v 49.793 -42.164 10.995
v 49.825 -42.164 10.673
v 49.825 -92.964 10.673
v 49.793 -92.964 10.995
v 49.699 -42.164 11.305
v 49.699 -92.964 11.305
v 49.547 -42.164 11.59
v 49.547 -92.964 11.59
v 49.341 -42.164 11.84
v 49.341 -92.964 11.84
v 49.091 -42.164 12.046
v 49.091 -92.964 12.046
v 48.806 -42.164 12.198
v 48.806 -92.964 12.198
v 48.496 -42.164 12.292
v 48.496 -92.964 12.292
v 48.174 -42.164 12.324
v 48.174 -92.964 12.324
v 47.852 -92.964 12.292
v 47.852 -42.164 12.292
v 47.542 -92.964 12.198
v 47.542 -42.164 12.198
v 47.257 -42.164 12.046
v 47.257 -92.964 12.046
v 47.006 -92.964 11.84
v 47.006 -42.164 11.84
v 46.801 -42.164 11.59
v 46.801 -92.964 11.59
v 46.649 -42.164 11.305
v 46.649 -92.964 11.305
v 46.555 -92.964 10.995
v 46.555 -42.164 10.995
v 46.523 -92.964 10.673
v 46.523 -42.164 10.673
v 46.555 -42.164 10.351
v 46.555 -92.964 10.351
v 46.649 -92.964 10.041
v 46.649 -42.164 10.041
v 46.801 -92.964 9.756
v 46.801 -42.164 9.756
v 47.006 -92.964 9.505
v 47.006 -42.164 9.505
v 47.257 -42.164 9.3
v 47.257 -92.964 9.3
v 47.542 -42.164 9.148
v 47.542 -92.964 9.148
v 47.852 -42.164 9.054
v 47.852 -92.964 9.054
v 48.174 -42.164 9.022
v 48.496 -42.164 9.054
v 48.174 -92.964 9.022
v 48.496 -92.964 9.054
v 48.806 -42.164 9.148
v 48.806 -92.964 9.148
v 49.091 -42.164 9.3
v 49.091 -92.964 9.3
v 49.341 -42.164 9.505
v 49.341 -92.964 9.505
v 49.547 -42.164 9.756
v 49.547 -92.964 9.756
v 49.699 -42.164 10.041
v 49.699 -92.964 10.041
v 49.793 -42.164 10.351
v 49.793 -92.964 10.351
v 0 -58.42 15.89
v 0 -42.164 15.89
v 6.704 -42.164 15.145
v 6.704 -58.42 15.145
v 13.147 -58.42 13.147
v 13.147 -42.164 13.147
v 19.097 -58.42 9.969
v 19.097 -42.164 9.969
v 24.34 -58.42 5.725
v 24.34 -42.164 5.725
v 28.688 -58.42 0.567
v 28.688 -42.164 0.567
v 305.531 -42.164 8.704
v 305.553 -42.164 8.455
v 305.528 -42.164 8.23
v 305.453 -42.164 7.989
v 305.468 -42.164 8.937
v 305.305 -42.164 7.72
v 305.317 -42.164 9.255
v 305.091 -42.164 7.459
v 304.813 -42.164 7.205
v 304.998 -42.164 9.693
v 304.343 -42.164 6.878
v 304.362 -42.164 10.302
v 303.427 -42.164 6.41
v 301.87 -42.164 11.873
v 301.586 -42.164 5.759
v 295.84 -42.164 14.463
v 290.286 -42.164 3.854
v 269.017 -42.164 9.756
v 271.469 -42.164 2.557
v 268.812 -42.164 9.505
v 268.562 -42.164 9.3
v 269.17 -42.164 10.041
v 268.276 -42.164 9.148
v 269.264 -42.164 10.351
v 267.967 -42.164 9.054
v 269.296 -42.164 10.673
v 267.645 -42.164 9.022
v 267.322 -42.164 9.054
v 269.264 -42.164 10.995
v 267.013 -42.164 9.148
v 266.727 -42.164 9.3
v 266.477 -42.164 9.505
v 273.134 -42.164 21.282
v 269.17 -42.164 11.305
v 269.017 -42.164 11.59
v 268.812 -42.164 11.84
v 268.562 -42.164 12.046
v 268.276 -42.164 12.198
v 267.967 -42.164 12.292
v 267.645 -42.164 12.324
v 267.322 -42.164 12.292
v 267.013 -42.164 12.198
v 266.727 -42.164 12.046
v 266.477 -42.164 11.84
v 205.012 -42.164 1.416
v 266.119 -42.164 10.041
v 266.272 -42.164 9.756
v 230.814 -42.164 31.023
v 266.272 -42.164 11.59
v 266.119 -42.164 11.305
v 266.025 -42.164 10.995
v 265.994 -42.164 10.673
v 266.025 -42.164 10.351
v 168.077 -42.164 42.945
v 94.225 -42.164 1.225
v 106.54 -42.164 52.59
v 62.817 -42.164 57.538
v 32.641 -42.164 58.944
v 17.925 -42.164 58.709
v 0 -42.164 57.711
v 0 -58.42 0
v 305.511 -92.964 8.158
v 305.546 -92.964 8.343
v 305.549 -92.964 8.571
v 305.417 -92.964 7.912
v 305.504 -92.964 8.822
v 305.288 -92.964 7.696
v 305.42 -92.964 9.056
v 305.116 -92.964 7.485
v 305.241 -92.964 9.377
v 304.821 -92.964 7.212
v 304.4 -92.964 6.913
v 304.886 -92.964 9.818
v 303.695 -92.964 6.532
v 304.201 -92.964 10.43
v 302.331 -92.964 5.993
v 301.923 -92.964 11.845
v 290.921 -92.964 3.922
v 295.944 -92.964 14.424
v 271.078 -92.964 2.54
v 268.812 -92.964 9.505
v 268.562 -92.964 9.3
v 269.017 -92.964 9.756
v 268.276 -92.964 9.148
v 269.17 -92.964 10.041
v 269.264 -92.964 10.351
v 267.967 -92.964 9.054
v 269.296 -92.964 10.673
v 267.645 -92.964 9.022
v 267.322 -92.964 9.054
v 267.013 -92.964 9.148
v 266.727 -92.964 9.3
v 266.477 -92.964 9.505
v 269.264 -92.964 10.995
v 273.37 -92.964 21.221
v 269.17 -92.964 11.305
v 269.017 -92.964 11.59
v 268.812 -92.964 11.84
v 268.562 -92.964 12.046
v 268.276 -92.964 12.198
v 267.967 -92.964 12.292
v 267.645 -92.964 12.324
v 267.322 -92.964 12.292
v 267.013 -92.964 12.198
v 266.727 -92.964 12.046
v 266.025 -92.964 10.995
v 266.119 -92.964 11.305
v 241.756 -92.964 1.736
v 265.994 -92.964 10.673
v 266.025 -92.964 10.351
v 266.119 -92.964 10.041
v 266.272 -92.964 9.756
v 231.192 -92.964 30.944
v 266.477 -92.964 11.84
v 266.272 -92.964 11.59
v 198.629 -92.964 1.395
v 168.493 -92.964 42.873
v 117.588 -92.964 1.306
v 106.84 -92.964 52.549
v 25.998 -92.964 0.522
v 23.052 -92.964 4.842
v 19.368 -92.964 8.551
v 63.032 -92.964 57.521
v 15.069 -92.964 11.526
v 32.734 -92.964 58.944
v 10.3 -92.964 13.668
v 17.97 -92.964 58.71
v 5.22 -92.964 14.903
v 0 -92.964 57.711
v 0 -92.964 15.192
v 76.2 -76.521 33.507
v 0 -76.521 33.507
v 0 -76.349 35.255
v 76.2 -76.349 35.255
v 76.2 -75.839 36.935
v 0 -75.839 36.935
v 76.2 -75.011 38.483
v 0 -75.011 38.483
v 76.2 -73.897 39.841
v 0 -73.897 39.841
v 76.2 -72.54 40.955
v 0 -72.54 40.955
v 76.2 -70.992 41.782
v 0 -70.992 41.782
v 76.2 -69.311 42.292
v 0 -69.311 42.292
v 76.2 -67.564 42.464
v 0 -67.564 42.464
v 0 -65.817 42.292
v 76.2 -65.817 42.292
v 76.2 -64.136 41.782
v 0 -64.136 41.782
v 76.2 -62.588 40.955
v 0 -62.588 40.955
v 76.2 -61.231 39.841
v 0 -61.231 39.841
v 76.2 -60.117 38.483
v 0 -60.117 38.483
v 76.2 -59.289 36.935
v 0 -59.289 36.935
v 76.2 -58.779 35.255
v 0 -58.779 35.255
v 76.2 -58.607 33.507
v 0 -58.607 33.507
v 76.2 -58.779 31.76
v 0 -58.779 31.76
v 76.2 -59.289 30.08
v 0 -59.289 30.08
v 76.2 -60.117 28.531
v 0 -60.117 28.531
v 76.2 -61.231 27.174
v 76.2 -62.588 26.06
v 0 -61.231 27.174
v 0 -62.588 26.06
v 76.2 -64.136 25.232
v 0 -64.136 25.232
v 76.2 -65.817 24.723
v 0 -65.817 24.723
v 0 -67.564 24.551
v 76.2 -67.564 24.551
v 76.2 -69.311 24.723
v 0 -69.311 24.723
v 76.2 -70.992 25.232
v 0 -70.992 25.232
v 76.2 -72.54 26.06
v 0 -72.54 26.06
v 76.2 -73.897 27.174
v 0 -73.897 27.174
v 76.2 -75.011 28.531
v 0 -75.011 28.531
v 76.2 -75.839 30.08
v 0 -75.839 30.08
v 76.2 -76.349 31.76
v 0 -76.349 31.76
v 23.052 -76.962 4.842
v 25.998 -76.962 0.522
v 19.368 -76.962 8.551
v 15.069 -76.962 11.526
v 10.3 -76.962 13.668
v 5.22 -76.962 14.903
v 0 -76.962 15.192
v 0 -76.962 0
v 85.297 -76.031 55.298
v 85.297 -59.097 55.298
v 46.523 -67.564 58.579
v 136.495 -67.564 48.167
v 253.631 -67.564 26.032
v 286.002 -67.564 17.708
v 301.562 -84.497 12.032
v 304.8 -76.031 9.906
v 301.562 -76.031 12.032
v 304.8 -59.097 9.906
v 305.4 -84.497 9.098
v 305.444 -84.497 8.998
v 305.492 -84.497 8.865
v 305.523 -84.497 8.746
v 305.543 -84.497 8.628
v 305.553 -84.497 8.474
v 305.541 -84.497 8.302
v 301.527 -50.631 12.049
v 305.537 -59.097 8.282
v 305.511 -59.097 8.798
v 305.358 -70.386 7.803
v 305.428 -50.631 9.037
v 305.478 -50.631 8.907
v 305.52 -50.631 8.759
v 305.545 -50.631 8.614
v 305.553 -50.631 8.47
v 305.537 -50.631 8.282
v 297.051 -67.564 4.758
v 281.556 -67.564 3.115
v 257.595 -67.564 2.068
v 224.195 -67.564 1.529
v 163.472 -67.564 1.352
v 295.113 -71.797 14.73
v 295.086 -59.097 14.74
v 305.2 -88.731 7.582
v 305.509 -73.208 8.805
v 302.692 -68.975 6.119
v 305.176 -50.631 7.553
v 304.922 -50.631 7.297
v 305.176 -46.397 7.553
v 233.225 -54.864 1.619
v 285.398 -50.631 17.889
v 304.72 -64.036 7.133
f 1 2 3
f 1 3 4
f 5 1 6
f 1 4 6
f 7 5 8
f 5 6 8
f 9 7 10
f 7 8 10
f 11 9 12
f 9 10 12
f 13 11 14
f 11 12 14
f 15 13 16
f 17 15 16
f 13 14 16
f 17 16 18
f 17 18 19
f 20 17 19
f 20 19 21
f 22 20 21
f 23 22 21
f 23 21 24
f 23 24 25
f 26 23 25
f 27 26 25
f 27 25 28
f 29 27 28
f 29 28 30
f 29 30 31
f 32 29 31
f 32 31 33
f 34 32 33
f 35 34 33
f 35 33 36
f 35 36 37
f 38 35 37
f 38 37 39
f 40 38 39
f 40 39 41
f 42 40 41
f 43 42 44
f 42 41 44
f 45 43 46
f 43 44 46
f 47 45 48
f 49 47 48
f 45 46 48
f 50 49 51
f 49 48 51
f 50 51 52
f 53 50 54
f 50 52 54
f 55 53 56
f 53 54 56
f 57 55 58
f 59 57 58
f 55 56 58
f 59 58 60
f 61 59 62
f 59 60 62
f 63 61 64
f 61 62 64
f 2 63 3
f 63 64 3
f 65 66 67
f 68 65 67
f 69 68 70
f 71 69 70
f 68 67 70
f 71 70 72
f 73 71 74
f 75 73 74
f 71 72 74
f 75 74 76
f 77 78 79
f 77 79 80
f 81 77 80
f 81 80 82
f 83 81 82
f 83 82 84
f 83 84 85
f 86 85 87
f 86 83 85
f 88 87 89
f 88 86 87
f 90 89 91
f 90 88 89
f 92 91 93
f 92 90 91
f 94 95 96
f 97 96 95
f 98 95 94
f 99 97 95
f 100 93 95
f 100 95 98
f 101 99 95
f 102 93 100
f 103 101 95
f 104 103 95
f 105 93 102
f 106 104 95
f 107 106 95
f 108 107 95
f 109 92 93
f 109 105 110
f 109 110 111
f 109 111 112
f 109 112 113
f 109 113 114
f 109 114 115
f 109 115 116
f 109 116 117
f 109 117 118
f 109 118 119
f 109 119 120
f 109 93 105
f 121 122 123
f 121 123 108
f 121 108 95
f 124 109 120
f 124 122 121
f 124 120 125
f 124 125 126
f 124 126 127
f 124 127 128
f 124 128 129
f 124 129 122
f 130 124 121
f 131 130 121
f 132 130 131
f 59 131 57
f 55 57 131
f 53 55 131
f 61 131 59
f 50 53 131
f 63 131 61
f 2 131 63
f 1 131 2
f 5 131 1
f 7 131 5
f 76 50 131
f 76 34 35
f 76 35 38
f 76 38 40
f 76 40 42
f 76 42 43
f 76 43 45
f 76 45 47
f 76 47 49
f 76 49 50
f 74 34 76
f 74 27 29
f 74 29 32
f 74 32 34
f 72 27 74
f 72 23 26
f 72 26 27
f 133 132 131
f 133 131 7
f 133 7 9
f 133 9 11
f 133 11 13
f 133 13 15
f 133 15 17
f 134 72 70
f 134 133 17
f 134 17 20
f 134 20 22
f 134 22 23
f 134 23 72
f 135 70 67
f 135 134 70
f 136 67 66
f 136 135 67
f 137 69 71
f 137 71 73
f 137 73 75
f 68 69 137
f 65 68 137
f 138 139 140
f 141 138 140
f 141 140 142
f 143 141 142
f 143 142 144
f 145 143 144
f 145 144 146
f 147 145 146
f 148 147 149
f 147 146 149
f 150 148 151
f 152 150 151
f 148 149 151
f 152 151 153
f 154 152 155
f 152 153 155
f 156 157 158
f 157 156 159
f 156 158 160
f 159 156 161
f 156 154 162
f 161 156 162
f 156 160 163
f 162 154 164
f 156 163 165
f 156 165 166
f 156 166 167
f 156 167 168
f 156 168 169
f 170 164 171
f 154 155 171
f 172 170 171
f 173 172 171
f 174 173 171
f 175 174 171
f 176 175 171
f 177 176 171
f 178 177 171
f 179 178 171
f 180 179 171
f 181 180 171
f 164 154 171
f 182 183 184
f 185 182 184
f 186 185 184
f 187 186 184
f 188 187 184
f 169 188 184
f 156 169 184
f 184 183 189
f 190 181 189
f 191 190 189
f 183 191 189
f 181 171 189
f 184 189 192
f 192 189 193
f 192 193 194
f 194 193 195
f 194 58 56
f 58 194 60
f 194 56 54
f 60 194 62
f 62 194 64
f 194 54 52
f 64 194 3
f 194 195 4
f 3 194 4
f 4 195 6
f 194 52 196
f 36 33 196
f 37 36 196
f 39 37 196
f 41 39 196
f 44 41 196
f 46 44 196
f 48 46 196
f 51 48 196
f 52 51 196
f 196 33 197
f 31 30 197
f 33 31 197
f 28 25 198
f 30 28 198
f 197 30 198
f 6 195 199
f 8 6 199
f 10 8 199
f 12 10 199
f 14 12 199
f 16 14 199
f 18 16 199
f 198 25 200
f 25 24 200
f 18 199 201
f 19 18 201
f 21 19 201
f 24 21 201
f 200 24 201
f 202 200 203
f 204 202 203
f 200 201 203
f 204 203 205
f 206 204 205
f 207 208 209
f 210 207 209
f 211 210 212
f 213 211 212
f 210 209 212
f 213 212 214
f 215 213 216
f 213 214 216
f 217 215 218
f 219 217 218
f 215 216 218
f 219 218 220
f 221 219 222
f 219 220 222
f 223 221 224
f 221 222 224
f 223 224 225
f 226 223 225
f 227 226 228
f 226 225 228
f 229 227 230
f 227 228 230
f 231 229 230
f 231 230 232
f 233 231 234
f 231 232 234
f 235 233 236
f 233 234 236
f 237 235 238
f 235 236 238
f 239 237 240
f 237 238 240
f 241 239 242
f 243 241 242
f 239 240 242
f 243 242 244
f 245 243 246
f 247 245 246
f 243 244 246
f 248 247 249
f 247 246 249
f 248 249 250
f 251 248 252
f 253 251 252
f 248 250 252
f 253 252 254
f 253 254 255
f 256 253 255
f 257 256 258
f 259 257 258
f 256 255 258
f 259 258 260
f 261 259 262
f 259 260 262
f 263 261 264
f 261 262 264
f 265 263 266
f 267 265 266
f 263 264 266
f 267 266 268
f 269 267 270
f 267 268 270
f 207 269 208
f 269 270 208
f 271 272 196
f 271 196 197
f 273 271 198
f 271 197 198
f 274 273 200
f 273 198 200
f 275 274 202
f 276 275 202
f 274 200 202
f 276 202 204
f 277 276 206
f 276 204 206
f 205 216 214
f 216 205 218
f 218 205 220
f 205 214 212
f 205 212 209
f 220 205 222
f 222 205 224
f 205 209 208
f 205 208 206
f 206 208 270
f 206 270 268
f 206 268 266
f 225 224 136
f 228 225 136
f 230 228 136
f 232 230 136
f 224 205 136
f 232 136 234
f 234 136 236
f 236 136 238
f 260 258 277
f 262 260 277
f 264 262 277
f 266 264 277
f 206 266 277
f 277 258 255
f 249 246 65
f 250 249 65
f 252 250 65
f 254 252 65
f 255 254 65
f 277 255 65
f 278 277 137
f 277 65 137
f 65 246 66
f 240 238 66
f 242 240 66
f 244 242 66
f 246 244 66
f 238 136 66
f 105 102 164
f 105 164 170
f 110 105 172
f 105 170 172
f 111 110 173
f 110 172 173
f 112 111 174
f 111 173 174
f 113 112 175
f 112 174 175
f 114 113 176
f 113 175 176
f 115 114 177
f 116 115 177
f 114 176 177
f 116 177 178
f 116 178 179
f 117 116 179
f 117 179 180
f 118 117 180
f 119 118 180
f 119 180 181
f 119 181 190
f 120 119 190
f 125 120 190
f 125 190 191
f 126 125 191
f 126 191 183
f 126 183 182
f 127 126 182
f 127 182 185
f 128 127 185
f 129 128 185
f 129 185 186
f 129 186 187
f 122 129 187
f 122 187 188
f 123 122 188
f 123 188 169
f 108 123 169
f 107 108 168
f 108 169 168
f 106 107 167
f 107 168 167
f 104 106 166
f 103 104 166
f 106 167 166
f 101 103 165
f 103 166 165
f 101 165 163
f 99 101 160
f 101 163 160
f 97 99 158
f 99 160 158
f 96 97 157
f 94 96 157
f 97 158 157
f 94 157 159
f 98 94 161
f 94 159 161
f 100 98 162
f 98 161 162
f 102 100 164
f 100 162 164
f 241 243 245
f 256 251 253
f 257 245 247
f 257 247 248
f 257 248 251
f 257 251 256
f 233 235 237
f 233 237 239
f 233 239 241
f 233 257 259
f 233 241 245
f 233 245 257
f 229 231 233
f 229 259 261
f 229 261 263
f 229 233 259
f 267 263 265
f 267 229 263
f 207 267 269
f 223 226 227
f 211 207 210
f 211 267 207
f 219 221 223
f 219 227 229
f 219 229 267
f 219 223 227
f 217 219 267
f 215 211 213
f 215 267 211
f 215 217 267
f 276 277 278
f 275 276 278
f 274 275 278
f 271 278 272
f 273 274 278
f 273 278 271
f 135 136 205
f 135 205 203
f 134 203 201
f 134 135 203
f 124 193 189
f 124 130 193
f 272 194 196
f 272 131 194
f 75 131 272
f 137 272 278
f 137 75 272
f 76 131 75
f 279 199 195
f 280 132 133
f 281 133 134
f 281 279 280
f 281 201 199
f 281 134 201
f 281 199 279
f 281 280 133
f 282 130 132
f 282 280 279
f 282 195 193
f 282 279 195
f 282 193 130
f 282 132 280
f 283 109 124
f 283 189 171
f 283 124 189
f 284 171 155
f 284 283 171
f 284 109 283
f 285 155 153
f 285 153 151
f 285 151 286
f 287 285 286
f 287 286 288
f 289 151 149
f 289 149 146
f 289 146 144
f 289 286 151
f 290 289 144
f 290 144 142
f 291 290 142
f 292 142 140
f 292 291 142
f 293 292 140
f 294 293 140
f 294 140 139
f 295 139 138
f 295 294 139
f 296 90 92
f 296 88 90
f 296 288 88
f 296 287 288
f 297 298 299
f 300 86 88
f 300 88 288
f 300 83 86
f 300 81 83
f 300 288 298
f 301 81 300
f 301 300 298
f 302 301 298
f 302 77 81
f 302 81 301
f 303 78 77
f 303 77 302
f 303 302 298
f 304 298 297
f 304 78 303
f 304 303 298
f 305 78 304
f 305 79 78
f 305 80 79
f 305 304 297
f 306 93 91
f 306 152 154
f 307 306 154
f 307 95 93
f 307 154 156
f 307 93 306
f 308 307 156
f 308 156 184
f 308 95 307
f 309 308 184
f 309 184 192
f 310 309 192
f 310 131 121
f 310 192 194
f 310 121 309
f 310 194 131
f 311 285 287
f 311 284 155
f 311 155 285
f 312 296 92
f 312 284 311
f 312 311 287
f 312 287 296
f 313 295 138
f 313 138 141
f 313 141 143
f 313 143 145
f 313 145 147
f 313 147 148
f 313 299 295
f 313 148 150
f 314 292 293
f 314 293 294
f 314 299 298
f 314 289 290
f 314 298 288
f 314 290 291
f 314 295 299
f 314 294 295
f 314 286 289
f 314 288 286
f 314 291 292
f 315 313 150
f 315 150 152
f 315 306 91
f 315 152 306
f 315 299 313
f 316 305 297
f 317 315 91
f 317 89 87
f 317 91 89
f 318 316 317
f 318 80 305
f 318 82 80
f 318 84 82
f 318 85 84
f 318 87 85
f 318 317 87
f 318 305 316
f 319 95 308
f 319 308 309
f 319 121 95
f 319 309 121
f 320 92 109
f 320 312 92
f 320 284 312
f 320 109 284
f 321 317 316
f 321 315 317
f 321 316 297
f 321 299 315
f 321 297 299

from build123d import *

# Parameters (mm, degrees)
F1_DEPTH  = 42.164
F3_DEPTH  = 50.8
F5_R      = 8.9567079673
F6_DEPTH  = 76.2
F8_DEPTH  = 16.002
F10_DEPTH = 16.256
F11_R     = 1.651
F12_DEPTH = 59.944
F13_DEPTH = 89.916


with BuildPart() as f1:
    # F0 (on Front) → F1 (new body)
    with BuildSketch(Plane.XZ):
        Polygon((0, 69.088), (0, 0), (304.8, 0), (304.8, 19.812), align=None)
    extrude(amount=F1_DEPTH)


with BuildPart() as f3:
    # F2 (on face) → F3 (new body)
    with BuildSketch(Plane.XZ.offset(42.164)):
        with BuildLine():
            add(Edge.make_bspline(
                [(0, 57.7113069594), (20.3099937027, 59.0195676413), (73.6764002437, 62.8389829446), (452.3676579415, -9.0422647295), (160.7904136181, 3.7707102019), (0, 0)],
                knots=[0, 0, 0, 0, 0.2216706751, 0.58094023, 1, 1, 1, 1], degree=3))
            Line((0, 57.7113069594), (0, 0))
        make_face()
    extrude(amount=F3_DEPTH)

    # F5 (on face) → F6 (cut)
    with BuildSketch(Plane(origin=(0, 0, 0), x_dir=(0, -1, 0), z_dir=(-1, 0, 0))):
        with Locations((67.564, 33.5073322058)):
            Circle(F5_R)
    extrude(amount=-F6_DEPTH, mode=Mode.SUBTRACT)

    # F7 (on face) → F8 (cut)
    with BuildSketch(Plane.XZ.offset(92.964)):
        with BuildLine():
            ThreePointArc((0, 15.1919266209), (14.9223036814, 11.2659249778), (25.9978323859, 0.5224944281))
            ThreePointArc((25.9978323859, 0.5224944281), (15.0693060862, 11.5264493001), (0, 15.1919266209))
        make_face()
        with BuildLine():
            Line((0, 0), (25.9978323859, 0.5224944281))
            ThreePointArc((25.9978323859, 0.5224944281), (14.9223036814, 11.2659249778), (0, 15.1919266209))
            Line((0, 15.1919266209), (0, 0))
        make_face()
    extrude(amount=-F8_DEPTH, mode=Mode.SUBTRACT)

    # F9 (on face) → F10 (cut)
    with BuildSketch(Plane(origin=(0, -42.164, 0), x_dir=(-1, 0, 0), z_dir=(0, 1, 0))):
        with BuildLine():
            Line((0, 0), (0, 15.890294686))
            ThreePointArc((0, 15.890294686), (-16.1975784719, 11.6991220878), (-28.6879014286, 0.5672171054))
            Line((-28.6879014286, 0.5672171054), (0, 0))
        make_face()
    extrude(amount=-F10_DEPTH, mode=Mode.SUBTRACT)

    # F11 (on face) → F12 (cut)
    with BuildSketch(Plane.XZ.offset(92.964)):
        with Locations((48.173867166, 10.6728887185)):
            Circle(F11_R)
        with Locations((267.6445245743, 10.6728887185)):
            Circle(F11_R)
    extrude(amount=-F12_DEPTH, mode=Mode.SUBTRACT)

    # F11 (on face) → F13 (cut)
    with BuildSketch(Plane.XZ.offset(92.964)):
        with Locations((48.173867166, 10.6728887185)):
            Circle(F11_R)
        with Locations((267.6445245743, 10.6728887185)):
            Circle(F11_R)
    extrude(amount=-F13_DEPTH, mode=Mode.SUBTRACT)


solid = f3.part
